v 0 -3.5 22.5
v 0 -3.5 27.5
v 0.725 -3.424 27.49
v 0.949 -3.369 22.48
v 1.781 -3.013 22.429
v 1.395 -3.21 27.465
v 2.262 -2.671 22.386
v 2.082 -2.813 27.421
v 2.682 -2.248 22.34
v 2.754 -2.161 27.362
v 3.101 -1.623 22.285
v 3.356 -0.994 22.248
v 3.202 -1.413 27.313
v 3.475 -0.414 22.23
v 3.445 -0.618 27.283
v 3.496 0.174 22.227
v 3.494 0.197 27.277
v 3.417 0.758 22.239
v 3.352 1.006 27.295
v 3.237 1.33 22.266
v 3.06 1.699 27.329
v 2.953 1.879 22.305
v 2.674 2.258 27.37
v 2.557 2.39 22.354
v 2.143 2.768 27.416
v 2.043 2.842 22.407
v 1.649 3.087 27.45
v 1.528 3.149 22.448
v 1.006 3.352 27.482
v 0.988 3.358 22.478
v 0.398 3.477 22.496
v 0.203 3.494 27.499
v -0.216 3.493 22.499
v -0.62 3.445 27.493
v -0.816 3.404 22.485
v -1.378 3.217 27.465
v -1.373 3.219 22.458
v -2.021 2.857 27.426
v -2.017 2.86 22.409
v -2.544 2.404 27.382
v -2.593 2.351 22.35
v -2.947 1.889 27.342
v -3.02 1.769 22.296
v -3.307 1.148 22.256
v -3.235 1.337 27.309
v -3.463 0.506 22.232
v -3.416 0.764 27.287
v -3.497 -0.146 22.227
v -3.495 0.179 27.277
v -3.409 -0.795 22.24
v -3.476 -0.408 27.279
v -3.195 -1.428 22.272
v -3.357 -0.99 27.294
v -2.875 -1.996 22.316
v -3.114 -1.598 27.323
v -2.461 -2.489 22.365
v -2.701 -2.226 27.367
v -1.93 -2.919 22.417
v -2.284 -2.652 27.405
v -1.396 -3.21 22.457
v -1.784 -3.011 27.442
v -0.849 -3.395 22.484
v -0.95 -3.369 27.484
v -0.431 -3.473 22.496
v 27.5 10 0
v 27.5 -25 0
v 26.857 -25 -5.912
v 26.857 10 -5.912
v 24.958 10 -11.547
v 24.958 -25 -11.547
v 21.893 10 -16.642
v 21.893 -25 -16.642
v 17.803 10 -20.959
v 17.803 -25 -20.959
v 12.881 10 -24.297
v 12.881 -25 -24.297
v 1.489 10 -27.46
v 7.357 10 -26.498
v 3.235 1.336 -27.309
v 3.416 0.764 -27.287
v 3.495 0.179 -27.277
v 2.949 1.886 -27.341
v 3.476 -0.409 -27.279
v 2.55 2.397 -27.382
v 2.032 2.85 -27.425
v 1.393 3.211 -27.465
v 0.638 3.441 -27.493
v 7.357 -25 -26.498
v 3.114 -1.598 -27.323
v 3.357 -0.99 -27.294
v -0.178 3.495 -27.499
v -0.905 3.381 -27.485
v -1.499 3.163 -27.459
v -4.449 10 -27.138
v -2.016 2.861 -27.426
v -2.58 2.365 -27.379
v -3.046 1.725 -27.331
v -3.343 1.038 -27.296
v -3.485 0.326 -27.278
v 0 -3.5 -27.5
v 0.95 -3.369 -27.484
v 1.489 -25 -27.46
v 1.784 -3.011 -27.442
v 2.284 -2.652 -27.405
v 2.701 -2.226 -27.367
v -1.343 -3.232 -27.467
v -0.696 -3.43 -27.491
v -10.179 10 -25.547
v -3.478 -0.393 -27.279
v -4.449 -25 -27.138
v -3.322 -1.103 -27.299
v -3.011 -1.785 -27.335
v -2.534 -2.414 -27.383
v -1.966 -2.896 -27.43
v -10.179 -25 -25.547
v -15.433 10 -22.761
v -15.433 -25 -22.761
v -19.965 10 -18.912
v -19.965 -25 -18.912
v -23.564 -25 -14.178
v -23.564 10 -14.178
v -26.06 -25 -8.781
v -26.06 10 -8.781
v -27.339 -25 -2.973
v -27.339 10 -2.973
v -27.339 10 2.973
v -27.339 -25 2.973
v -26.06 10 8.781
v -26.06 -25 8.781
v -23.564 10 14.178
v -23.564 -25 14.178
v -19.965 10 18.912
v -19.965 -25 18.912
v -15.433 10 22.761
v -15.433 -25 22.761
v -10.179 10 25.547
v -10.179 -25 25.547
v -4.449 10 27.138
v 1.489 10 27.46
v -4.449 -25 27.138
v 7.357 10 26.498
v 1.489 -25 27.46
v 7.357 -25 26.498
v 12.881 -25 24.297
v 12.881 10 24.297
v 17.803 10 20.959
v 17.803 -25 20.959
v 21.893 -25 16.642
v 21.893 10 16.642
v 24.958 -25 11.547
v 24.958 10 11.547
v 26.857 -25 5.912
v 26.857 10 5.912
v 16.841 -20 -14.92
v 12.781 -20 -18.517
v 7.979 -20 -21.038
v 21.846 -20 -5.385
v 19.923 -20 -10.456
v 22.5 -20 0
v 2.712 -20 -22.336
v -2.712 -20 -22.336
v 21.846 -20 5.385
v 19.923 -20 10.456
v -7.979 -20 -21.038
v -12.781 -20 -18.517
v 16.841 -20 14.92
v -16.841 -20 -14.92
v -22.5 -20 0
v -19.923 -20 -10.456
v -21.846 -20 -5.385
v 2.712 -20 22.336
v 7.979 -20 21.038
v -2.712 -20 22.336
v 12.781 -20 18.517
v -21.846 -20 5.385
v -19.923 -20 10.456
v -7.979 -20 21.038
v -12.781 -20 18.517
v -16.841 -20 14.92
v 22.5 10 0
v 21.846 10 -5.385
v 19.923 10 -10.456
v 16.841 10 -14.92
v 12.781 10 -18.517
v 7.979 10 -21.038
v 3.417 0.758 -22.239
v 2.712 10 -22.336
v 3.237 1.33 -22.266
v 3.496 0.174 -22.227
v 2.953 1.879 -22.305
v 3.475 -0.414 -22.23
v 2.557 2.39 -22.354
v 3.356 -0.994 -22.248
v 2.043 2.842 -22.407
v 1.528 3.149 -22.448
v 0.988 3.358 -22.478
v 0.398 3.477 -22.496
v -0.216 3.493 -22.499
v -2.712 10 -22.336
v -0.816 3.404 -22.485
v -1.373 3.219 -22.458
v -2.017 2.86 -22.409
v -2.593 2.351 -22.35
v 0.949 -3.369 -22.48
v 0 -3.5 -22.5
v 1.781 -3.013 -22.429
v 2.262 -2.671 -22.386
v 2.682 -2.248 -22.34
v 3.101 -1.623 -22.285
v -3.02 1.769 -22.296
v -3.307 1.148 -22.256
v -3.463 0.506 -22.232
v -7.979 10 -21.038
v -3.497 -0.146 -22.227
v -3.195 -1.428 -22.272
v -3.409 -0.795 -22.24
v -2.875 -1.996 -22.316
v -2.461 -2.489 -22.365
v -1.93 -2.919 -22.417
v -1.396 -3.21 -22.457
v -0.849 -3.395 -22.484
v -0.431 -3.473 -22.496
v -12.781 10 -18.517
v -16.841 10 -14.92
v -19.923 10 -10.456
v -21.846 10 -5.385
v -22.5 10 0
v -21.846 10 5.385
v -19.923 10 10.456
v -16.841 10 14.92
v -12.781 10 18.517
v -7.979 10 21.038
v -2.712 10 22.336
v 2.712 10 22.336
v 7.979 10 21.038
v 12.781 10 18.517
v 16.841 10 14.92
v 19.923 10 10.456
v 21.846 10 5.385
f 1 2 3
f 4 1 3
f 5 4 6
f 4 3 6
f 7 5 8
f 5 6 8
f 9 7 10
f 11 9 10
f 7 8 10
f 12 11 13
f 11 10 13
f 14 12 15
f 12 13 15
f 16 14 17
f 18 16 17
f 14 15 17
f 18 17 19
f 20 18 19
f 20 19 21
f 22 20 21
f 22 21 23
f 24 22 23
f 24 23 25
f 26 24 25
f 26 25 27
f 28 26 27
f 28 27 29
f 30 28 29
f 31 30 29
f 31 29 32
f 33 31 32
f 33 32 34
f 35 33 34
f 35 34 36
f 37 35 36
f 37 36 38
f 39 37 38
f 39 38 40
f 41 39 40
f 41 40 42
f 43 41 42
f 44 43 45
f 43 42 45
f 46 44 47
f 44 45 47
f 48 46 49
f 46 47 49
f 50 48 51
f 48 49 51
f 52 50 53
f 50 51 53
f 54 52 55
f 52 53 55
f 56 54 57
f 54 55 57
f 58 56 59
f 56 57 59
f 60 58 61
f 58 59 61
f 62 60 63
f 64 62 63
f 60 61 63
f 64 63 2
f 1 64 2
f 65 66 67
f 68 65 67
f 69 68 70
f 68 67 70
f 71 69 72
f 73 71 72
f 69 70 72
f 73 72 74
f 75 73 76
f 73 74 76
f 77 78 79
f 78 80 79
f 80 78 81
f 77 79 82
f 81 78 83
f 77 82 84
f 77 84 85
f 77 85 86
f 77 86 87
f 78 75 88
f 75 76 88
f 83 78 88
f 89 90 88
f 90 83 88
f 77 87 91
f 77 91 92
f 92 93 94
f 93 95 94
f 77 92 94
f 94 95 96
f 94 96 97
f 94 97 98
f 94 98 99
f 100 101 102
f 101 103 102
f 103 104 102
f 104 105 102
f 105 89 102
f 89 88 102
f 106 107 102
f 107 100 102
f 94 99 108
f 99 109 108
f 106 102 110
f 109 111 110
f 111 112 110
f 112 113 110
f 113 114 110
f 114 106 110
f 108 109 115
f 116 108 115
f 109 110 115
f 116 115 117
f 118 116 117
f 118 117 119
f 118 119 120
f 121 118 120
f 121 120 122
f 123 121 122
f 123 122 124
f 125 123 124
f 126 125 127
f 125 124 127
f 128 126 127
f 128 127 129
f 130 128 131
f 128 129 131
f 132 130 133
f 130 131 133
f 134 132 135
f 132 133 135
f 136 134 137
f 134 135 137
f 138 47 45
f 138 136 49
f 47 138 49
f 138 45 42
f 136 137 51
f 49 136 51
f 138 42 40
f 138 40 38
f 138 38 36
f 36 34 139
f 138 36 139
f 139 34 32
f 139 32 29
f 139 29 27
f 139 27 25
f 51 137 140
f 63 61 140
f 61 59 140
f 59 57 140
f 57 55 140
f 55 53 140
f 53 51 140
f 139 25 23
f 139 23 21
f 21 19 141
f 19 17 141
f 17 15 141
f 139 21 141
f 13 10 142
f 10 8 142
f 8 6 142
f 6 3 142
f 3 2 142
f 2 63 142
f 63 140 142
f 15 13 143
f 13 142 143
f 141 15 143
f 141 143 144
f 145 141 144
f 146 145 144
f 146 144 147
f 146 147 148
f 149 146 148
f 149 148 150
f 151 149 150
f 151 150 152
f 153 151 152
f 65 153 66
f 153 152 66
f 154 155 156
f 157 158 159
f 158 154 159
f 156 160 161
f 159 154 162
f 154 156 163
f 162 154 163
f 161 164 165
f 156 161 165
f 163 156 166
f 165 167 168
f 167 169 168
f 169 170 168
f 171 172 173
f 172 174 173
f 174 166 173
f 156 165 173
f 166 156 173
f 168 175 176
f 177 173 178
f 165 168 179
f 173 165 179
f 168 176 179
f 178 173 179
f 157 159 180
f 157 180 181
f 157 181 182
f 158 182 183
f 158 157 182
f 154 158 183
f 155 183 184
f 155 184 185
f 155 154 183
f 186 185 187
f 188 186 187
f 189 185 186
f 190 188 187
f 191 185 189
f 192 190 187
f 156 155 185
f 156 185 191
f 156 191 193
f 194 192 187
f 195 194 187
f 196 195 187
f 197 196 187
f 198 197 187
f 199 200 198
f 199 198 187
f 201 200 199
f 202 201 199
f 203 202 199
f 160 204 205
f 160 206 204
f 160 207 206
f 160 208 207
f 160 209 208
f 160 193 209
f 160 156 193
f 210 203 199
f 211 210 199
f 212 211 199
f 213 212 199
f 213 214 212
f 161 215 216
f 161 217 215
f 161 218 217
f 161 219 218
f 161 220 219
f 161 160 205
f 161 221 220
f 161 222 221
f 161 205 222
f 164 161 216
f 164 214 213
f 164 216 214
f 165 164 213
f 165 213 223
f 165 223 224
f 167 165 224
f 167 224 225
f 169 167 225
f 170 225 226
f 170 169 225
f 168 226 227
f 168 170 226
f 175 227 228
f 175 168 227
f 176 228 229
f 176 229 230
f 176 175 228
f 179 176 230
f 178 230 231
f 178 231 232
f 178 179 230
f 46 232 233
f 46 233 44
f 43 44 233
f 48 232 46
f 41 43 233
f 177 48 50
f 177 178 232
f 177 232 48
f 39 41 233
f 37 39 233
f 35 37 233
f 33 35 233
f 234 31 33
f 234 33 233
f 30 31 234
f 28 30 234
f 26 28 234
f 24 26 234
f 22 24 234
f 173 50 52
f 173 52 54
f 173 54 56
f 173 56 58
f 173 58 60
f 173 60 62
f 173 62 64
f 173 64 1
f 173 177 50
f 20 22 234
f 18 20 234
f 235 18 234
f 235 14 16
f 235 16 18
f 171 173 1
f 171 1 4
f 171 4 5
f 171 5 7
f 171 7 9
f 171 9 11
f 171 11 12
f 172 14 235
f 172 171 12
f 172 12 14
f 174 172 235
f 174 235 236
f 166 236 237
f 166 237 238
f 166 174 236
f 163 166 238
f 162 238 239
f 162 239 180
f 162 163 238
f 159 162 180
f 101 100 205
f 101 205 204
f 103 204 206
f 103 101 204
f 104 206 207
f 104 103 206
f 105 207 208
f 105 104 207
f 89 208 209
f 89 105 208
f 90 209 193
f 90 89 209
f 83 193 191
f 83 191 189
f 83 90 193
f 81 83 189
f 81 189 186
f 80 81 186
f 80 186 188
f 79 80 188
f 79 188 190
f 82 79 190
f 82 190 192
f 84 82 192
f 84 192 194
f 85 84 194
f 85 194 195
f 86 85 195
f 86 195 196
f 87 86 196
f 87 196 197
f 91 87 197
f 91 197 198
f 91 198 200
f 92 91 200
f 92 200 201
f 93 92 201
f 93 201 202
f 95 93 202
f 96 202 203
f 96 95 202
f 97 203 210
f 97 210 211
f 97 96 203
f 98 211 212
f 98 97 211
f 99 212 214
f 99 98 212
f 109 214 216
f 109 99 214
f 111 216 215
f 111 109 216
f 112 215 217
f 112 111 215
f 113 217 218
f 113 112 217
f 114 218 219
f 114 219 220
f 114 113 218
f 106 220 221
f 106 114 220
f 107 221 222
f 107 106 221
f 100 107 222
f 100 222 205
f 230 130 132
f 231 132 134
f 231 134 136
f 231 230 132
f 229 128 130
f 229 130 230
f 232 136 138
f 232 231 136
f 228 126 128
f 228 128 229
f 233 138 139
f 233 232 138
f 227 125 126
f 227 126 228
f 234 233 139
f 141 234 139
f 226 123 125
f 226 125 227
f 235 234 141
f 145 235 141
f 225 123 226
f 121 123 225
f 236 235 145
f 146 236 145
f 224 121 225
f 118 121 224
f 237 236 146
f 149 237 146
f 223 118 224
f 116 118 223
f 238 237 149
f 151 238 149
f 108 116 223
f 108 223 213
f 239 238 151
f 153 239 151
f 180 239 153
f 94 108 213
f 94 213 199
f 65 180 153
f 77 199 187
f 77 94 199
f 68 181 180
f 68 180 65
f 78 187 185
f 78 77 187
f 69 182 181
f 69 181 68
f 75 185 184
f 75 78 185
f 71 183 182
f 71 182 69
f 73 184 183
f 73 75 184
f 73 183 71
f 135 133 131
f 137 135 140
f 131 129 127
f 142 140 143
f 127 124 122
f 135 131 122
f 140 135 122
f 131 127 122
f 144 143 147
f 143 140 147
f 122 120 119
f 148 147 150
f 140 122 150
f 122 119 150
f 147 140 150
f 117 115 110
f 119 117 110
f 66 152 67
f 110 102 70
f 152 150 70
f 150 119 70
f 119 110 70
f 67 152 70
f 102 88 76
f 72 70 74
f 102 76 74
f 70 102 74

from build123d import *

# Parameters (mm, degrees)
EXTRUDE_THIN1_DEPTH      = 10
EXTRUDE_THIN1_DEPTH_BACK = 25
SKETCH1_R                = 27.5
SKETCH1_R_2              = 22.5
CUT_EXTRUDE1_REACH       = 68.38
CUT_EXTRUDE1_END_RADIUS  = 22.5
SKETCH2_R                = 3.5
BOSS_EXTRUDE1_START      = -5
SKETCH3_R                = 22.5
BOSS_EXTRUDE1_DEPTH      = 5


with BuildPart() as part:
    # Sketch1 → Extrude-Thin1 (new, two sides: drawn at the far end of the back side and taken through both)
    with BuildSketch(Plane(origin=(0, 0, 0), x_dir=(1, 0, 0), z_dir=(0, 1, 0)).offset(-EXTRUDE_THIN1_DEPTH_BACK)):
        Circle(SKETCH1_R)
        Circle(SKETCH1_R_2, mode=Mode.SUBTRACT)
    extrude(amount=EXTRUDE_THIN1_DEPTH + EXTRUDE_THIN1_DEPTH_BACK)

    # Cut-Extrude1: up to this cylinder (the profile starts outside it)
    cut_extrude1_end = Plane(origin=(0, 0, 0), z_dir=(0, 1, 0)) * Cylinder(CUT_EXTRUDE1_END_RADIUS, 182.76, mode=Mode.PRIVATE)
    # Sketch2 → Cut-Extrude1 (cut, up to the surface)
    with BuildSketch(Plane.XY.offset(27.5), mode=Mode.PRIVATE) as cut_extrude1_sk1:
        with Locations(Location((0, 0, 0), (0, 0, 270))):
            Circle(SKETCH2_R)
    cut_extrude1_tool1 = extrude(cut_extrude1_sk1.sketch, amount=-CUT_EXTRUDE1_REACH, mode=Mode.PRIVATE) - cut_extrude1_end
    cut_extrude1 = cut_extrude1_tool1.solids().sort_by_distance((0, 0, 27.5))[0]
    add(cut_extrude1, mode=Mode.SUBTRACT)

    # Mirror1: Cut-Extrude1 across plane
    add(cut_extrude1.mirror(Plane.XY), mode=Mode.SUBTRACT)

    # Sketch3 → Boss-Extrude1 (add)
    with BuildSketch(Plane.XZ.offset(25).offset(BOSS_EXTRUDE1_START)):
        with Locations(Location((0, 0, 0), (0, 0, 90))):
            Circle(SKETCH3_R)
    extrude(amount=BOSS_EXTRUDE1_DEPTH)


solid = part.part
